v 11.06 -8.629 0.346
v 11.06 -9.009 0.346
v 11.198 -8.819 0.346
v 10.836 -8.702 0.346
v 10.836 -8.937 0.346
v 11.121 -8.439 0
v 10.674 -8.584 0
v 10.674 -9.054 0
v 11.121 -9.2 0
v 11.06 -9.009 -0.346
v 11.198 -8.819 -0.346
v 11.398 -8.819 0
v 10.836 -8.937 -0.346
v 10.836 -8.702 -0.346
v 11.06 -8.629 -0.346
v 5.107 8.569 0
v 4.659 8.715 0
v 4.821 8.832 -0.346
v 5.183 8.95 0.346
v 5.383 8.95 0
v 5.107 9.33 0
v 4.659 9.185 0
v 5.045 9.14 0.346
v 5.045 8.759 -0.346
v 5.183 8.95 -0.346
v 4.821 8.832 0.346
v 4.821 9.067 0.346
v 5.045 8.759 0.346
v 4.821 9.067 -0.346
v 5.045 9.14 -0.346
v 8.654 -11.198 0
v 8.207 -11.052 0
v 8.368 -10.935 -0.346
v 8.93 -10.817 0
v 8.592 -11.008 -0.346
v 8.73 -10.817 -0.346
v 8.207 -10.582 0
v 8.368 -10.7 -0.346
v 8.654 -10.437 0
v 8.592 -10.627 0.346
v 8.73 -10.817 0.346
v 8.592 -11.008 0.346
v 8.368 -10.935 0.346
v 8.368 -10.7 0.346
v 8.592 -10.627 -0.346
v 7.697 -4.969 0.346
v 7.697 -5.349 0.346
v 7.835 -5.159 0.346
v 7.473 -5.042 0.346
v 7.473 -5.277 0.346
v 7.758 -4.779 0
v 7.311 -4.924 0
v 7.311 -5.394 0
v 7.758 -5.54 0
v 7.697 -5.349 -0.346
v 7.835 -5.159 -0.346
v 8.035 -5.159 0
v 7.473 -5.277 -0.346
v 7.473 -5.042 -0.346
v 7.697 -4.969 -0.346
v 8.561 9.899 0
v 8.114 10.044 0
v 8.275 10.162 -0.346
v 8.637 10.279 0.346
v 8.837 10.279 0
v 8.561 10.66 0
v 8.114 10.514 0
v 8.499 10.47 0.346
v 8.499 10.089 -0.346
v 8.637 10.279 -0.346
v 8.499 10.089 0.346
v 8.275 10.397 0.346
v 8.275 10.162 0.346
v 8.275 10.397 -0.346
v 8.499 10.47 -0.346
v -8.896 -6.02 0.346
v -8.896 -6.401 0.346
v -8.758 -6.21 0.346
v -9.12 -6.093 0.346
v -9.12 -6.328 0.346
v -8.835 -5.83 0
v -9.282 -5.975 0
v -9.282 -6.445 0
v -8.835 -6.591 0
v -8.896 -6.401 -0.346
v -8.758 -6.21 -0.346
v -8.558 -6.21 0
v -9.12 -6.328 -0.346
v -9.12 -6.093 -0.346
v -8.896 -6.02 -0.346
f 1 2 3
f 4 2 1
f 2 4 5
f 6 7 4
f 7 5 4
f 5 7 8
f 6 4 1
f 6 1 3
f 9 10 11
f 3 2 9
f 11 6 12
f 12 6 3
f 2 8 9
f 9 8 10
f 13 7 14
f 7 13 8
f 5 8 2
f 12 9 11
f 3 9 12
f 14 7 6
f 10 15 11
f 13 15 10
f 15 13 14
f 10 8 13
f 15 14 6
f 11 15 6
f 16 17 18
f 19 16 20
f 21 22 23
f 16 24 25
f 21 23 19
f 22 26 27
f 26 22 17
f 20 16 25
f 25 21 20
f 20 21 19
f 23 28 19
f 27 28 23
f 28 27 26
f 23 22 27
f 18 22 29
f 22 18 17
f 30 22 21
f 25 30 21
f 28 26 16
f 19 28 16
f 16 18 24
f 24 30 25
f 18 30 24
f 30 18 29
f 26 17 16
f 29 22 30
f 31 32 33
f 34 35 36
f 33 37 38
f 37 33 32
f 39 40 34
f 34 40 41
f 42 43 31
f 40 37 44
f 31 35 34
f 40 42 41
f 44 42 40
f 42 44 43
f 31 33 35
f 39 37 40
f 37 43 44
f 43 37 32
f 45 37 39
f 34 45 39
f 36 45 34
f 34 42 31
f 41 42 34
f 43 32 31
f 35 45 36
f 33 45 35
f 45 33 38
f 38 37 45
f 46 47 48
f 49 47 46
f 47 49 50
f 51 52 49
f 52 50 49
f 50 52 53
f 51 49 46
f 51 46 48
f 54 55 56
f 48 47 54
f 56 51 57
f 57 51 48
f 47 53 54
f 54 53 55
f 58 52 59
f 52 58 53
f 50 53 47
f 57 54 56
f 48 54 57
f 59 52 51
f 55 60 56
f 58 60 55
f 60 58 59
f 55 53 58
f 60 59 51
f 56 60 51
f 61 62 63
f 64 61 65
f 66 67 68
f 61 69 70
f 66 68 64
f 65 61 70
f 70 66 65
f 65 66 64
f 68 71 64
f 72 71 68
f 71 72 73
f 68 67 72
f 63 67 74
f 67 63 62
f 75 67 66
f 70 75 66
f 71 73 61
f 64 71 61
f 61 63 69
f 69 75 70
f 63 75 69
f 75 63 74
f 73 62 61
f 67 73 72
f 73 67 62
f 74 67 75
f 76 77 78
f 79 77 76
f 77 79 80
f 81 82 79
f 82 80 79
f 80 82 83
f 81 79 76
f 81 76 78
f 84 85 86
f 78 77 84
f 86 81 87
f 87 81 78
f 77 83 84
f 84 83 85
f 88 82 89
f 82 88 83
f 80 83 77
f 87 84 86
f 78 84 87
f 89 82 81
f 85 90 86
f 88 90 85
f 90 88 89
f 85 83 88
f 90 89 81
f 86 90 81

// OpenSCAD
points = [
    for ([0: 5])[rnd(-11, 11), rnd(-11, 11)]
];
faces = [
    [
        [10, 10],
        [10, -10],
        [-10, -10]
    ],
    [
        [10, 10],
        [-10, -10],
        [-10, 10]
    ],
];
res = subInsert(points, faces);
for (i = res) polyhedron(i, [    [0, 1, 2]]);
    for (i = points) translate(i) sphere(.4);


function subInsert(points, polys, b = 0, p = 0) =
let (
e=echo(str("point:",b," face:",p ," ",len(points)-1," ",len(polys)-1)),
pone = points[b], 
face = polys[p], 
hit = doesIntersect(face, pone), 
ec=echo(hit),
noChange = !hit, 
npolys = hit ? spiltFace(polys, p, pone) : polys)
  hit ? subInsert(points, npolys, b, p=0) :
p < len(polys)-1 ? subInsert(points, npolys, b, p + 1) :
  

b < len(points) -1 ? subInsert(points, npolys, b + 1, p=0) :

npolys;

function doesIntersect(poly, point) = 
   // !is_list(poly) ? false : len(poly) != 3 ? false :
    let (
    insideAB = 0 >  (point2line(point, poly[0], poly[1])), 
    insideBC = 0 >  (point2line(point, poly[1], poly[2])), 
    insideCA = 0 >   (point2line(point, poly[2], poly[0]))
        ,e=echo(poly,point,insideAB ,insideBC,insideCA)
)
insideAB && insideBC && insideCA;


function spiltFace(p, s, insert) =
let (
 poly = [    for (i = [0: len(p) - 1])        if (i != s) p[i]], 
 oldFaces = p[s],  
 newFaces = [
    [insert, oldFaces[0],     oldFaces   [1]    ],
    [insert, oldFaces[1],       oldFaces [2]    ],
    [insert, oldFaces[2],       oldFaces [0]    ]
],
 e=echo(str("create new: ",newFaces)))
concat(poly, newFaces);

function addTo(p, a) = [
    for (i = p) i + a
];

function clamp(v, a, b) = min(max(min(a, b), v), max(a, b));



function point2line(c, a, b) = ((b.x - a.x) * (c.y - a.y) - (b.y - a.y) * (c.x - a.x));
module polyline(p) {
    for (i = [0: max(0, len(p) - 2)]) line(p[i], p[wrap(i + 1, len(p))]);
} // polyline plotter
module line(p1, p2, width = 0.5) { // single line plotter
    hull() {
        translate(p1) sphere(width);
        translate(p2) sphere(width);
    }
}

function rnd(a = 1, b = 0, s = []) =
s == [] ? (rands(min(a, b), max(a, b), 1)[0]) :
(rands(min(a, b), max(a, b), 1, s)[0]);

function rndc(a = 1, b = 0) = [rnd(a, b), rnd(a, b), rnd(a, b)];

function lerp(start, end, bias) = (end * bias + start * (1 - bias));

function dot(a, b) = a * b;

//function heron(a, b, c) =
//let (s = (a + b + c) / 2) sqrt(abs(s * (s - a) * (s - b) * (s - c)));
//
//function polyarea(p1, p2, p3) = heron(norm(p1 - p2), norm(p2 - p3), len3(p2 - p1));
//
//function un(v) = is_list(v) ? v / max(is_undef(norm(v)) ? 0 : norm(v), 1e-16) : v;
////function avrg(l) = len(l) > 1 ? addl(l) / (len(l)) : l;
//function avrgp(l) = len(l) > 1 ? addlp(l) / (len(l)) : l;
//
//function addlp(v, i = 0, r = [0, 0, 0]) = i < len(v) ? addlp(v, i + 1, r + v[i]) : r;
//
//function faceNormal(v) = len(v) > 3 ? un(faceNormal([v[0], v[1], v[2]]) + faceNormal(concat([v[0]], [
//    for (i = [2: len(v) - 1]) v[i]
//]))) : let (u = v[0] - v[1], w = v[0] - v[2])
//un([u[1] * w[2] - u[2] * w[1], u[2] * w[0] - u[0] * w[2], u[0] * w[1] - u[1] * w[0]]);
//
//function p2n(pa, pb, pc) =
//let (u = pa - pb, v = pa - pc) un([u[1] * v[2] - u[2] * v[1], u[2] * v[0] - u[0] * v[2], u[0] * v[1] - u[1] * v[0]]);
//
//function v3(p) = [p.x, p.y, p.z]; // vec3 formatter
